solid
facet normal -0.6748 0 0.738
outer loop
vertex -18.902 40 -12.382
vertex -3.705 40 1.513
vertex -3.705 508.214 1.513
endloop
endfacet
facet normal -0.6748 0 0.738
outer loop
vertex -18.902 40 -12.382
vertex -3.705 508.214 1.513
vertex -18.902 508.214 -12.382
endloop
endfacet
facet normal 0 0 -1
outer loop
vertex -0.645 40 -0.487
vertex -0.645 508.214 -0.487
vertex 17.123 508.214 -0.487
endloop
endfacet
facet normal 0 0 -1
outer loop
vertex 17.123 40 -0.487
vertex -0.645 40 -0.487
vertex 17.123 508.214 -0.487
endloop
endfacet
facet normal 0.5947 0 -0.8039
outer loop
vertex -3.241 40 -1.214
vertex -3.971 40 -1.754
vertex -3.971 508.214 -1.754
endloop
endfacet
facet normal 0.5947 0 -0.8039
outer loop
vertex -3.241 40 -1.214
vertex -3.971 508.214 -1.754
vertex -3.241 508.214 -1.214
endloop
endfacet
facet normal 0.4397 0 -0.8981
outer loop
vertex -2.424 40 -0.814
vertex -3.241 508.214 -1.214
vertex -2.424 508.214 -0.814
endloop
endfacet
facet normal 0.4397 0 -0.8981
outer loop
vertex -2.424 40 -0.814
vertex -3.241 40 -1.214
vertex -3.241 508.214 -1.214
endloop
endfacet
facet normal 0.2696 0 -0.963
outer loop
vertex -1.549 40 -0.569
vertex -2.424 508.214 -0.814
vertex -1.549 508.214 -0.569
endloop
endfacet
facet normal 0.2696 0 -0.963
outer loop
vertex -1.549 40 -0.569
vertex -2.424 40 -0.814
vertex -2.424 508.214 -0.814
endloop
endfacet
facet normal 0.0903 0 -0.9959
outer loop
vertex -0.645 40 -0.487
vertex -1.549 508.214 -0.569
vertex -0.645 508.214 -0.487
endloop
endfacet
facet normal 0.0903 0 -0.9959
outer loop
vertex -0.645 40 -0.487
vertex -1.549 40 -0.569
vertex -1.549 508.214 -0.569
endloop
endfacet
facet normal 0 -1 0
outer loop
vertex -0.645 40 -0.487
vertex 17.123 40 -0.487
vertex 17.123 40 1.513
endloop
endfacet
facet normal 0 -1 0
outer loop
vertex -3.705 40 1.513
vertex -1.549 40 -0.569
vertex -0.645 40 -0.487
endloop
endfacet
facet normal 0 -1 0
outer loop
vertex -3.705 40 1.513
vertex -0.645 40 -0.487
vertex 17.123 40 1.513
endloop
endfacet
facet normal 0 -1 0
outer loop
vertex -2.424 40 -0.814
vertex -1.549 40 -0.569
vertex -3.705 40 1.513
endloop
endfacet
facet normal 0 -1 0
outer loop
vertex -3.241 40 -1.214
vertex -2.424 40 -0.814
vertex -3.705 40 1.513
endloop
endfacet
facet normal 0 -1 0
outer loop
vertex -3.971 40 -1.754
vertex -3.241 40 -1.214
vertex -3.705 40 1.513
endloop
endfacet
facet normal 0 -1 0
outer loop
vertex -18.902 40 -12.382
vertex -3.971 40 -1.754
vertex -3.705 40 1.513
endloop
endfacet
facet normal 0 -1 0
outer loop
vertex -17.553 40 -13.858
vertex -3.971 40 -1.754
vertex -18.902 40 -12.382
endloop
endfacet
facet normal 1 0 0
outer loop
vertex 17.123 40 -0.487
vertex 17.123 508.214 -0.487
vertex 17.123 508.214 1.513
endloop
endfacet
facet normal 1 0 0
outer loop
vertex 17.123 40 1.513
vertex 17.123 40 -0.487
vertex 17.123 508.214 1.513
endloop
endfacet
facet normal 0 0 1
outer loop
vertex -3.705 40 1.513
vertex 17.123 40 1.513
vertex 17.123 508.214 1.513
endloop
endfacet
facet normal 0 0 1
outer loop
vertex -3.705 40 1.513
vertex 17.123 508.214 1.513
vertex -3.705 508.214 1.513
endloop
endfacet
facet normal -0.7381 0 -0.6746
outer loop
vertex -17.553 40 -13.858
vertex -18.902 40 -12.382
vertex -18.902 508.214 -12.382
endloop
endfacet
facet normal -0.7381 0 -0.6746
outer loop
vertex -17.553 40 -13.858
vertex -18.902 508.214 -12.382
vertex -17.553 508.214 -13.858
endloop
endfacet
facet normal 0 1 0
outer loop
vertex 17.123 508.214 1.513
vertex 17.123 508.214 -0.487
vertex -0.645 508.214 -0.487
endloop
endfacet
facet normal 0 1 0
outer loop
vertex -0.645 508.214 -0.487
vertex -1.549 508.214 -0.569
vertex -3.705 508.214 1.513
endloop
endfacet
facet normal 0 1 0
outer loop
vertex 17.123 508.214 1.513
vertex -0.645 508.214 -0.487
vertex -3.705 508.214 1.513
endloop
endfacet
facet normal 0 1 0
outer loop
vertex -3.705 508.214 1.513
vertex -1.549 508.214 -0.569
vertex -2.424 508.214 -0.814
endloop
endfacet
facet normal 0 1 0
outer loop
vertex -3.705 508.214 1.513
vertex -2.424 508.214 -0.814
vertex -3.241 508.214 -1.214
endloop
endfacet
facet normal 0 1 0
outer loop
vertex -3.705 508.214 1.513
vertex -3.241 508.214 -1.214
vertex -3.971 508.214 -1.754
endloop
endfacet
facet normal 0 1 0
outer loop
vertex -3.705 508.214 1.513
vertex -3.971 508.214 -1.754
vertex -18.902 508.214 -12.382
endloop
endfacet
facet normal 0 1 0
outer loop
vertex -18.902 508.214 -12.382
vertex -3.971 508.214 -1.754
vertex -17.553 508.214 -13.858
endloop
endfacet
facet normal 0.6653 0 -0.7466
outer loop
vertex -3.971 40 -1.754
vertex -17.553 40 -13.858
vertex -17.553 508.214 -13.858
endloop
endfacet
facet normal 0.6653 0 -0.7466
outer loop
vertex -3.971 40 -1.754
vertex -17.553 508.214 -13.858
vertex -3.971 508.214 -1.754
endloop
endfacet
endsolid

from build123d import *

# Parameters (mm, degrees)
EXTRUDE_START   = 40
EXTRUDE_1_DEPTH = 468.213673317


with BuildPart() as part:
    # Эскиз1 → Вытянуть1 (new body)
    with BuildSketch(Plane(origin=(0, 0, 0), x_dir=(1, 0, 0), z_dir=(0, 1, 0)).offset(EXTRUDE_START)):
        with BuildLine():
            Line((-18.902286518, 12.381871272), (-17.552748119, 13.857928896))
            Line((-17.552748119, 13.857928896), (-3.97119008, 1.754112541))
            ThreePointArc((-3.97119008, 1.754112541), (-2.424474286, 0.81441735), (-0.644564969, 0.48688167))
            Line((-0.644564969, 0.48688167), (17.122829042, 0.48688167))
            Line((17.122829042, 0.48688167), (17.122829042, -1.51311833))
            Line((17.122829042, -1.51311833), (-3.70464164, -1.51311833))
            Line((-3.70464164, -1.51311833), (-18.902286518, 12.381871272))
        make_face()
    extrude(amount=EXTRUDE_1_DEPTH)


solid = part.part
